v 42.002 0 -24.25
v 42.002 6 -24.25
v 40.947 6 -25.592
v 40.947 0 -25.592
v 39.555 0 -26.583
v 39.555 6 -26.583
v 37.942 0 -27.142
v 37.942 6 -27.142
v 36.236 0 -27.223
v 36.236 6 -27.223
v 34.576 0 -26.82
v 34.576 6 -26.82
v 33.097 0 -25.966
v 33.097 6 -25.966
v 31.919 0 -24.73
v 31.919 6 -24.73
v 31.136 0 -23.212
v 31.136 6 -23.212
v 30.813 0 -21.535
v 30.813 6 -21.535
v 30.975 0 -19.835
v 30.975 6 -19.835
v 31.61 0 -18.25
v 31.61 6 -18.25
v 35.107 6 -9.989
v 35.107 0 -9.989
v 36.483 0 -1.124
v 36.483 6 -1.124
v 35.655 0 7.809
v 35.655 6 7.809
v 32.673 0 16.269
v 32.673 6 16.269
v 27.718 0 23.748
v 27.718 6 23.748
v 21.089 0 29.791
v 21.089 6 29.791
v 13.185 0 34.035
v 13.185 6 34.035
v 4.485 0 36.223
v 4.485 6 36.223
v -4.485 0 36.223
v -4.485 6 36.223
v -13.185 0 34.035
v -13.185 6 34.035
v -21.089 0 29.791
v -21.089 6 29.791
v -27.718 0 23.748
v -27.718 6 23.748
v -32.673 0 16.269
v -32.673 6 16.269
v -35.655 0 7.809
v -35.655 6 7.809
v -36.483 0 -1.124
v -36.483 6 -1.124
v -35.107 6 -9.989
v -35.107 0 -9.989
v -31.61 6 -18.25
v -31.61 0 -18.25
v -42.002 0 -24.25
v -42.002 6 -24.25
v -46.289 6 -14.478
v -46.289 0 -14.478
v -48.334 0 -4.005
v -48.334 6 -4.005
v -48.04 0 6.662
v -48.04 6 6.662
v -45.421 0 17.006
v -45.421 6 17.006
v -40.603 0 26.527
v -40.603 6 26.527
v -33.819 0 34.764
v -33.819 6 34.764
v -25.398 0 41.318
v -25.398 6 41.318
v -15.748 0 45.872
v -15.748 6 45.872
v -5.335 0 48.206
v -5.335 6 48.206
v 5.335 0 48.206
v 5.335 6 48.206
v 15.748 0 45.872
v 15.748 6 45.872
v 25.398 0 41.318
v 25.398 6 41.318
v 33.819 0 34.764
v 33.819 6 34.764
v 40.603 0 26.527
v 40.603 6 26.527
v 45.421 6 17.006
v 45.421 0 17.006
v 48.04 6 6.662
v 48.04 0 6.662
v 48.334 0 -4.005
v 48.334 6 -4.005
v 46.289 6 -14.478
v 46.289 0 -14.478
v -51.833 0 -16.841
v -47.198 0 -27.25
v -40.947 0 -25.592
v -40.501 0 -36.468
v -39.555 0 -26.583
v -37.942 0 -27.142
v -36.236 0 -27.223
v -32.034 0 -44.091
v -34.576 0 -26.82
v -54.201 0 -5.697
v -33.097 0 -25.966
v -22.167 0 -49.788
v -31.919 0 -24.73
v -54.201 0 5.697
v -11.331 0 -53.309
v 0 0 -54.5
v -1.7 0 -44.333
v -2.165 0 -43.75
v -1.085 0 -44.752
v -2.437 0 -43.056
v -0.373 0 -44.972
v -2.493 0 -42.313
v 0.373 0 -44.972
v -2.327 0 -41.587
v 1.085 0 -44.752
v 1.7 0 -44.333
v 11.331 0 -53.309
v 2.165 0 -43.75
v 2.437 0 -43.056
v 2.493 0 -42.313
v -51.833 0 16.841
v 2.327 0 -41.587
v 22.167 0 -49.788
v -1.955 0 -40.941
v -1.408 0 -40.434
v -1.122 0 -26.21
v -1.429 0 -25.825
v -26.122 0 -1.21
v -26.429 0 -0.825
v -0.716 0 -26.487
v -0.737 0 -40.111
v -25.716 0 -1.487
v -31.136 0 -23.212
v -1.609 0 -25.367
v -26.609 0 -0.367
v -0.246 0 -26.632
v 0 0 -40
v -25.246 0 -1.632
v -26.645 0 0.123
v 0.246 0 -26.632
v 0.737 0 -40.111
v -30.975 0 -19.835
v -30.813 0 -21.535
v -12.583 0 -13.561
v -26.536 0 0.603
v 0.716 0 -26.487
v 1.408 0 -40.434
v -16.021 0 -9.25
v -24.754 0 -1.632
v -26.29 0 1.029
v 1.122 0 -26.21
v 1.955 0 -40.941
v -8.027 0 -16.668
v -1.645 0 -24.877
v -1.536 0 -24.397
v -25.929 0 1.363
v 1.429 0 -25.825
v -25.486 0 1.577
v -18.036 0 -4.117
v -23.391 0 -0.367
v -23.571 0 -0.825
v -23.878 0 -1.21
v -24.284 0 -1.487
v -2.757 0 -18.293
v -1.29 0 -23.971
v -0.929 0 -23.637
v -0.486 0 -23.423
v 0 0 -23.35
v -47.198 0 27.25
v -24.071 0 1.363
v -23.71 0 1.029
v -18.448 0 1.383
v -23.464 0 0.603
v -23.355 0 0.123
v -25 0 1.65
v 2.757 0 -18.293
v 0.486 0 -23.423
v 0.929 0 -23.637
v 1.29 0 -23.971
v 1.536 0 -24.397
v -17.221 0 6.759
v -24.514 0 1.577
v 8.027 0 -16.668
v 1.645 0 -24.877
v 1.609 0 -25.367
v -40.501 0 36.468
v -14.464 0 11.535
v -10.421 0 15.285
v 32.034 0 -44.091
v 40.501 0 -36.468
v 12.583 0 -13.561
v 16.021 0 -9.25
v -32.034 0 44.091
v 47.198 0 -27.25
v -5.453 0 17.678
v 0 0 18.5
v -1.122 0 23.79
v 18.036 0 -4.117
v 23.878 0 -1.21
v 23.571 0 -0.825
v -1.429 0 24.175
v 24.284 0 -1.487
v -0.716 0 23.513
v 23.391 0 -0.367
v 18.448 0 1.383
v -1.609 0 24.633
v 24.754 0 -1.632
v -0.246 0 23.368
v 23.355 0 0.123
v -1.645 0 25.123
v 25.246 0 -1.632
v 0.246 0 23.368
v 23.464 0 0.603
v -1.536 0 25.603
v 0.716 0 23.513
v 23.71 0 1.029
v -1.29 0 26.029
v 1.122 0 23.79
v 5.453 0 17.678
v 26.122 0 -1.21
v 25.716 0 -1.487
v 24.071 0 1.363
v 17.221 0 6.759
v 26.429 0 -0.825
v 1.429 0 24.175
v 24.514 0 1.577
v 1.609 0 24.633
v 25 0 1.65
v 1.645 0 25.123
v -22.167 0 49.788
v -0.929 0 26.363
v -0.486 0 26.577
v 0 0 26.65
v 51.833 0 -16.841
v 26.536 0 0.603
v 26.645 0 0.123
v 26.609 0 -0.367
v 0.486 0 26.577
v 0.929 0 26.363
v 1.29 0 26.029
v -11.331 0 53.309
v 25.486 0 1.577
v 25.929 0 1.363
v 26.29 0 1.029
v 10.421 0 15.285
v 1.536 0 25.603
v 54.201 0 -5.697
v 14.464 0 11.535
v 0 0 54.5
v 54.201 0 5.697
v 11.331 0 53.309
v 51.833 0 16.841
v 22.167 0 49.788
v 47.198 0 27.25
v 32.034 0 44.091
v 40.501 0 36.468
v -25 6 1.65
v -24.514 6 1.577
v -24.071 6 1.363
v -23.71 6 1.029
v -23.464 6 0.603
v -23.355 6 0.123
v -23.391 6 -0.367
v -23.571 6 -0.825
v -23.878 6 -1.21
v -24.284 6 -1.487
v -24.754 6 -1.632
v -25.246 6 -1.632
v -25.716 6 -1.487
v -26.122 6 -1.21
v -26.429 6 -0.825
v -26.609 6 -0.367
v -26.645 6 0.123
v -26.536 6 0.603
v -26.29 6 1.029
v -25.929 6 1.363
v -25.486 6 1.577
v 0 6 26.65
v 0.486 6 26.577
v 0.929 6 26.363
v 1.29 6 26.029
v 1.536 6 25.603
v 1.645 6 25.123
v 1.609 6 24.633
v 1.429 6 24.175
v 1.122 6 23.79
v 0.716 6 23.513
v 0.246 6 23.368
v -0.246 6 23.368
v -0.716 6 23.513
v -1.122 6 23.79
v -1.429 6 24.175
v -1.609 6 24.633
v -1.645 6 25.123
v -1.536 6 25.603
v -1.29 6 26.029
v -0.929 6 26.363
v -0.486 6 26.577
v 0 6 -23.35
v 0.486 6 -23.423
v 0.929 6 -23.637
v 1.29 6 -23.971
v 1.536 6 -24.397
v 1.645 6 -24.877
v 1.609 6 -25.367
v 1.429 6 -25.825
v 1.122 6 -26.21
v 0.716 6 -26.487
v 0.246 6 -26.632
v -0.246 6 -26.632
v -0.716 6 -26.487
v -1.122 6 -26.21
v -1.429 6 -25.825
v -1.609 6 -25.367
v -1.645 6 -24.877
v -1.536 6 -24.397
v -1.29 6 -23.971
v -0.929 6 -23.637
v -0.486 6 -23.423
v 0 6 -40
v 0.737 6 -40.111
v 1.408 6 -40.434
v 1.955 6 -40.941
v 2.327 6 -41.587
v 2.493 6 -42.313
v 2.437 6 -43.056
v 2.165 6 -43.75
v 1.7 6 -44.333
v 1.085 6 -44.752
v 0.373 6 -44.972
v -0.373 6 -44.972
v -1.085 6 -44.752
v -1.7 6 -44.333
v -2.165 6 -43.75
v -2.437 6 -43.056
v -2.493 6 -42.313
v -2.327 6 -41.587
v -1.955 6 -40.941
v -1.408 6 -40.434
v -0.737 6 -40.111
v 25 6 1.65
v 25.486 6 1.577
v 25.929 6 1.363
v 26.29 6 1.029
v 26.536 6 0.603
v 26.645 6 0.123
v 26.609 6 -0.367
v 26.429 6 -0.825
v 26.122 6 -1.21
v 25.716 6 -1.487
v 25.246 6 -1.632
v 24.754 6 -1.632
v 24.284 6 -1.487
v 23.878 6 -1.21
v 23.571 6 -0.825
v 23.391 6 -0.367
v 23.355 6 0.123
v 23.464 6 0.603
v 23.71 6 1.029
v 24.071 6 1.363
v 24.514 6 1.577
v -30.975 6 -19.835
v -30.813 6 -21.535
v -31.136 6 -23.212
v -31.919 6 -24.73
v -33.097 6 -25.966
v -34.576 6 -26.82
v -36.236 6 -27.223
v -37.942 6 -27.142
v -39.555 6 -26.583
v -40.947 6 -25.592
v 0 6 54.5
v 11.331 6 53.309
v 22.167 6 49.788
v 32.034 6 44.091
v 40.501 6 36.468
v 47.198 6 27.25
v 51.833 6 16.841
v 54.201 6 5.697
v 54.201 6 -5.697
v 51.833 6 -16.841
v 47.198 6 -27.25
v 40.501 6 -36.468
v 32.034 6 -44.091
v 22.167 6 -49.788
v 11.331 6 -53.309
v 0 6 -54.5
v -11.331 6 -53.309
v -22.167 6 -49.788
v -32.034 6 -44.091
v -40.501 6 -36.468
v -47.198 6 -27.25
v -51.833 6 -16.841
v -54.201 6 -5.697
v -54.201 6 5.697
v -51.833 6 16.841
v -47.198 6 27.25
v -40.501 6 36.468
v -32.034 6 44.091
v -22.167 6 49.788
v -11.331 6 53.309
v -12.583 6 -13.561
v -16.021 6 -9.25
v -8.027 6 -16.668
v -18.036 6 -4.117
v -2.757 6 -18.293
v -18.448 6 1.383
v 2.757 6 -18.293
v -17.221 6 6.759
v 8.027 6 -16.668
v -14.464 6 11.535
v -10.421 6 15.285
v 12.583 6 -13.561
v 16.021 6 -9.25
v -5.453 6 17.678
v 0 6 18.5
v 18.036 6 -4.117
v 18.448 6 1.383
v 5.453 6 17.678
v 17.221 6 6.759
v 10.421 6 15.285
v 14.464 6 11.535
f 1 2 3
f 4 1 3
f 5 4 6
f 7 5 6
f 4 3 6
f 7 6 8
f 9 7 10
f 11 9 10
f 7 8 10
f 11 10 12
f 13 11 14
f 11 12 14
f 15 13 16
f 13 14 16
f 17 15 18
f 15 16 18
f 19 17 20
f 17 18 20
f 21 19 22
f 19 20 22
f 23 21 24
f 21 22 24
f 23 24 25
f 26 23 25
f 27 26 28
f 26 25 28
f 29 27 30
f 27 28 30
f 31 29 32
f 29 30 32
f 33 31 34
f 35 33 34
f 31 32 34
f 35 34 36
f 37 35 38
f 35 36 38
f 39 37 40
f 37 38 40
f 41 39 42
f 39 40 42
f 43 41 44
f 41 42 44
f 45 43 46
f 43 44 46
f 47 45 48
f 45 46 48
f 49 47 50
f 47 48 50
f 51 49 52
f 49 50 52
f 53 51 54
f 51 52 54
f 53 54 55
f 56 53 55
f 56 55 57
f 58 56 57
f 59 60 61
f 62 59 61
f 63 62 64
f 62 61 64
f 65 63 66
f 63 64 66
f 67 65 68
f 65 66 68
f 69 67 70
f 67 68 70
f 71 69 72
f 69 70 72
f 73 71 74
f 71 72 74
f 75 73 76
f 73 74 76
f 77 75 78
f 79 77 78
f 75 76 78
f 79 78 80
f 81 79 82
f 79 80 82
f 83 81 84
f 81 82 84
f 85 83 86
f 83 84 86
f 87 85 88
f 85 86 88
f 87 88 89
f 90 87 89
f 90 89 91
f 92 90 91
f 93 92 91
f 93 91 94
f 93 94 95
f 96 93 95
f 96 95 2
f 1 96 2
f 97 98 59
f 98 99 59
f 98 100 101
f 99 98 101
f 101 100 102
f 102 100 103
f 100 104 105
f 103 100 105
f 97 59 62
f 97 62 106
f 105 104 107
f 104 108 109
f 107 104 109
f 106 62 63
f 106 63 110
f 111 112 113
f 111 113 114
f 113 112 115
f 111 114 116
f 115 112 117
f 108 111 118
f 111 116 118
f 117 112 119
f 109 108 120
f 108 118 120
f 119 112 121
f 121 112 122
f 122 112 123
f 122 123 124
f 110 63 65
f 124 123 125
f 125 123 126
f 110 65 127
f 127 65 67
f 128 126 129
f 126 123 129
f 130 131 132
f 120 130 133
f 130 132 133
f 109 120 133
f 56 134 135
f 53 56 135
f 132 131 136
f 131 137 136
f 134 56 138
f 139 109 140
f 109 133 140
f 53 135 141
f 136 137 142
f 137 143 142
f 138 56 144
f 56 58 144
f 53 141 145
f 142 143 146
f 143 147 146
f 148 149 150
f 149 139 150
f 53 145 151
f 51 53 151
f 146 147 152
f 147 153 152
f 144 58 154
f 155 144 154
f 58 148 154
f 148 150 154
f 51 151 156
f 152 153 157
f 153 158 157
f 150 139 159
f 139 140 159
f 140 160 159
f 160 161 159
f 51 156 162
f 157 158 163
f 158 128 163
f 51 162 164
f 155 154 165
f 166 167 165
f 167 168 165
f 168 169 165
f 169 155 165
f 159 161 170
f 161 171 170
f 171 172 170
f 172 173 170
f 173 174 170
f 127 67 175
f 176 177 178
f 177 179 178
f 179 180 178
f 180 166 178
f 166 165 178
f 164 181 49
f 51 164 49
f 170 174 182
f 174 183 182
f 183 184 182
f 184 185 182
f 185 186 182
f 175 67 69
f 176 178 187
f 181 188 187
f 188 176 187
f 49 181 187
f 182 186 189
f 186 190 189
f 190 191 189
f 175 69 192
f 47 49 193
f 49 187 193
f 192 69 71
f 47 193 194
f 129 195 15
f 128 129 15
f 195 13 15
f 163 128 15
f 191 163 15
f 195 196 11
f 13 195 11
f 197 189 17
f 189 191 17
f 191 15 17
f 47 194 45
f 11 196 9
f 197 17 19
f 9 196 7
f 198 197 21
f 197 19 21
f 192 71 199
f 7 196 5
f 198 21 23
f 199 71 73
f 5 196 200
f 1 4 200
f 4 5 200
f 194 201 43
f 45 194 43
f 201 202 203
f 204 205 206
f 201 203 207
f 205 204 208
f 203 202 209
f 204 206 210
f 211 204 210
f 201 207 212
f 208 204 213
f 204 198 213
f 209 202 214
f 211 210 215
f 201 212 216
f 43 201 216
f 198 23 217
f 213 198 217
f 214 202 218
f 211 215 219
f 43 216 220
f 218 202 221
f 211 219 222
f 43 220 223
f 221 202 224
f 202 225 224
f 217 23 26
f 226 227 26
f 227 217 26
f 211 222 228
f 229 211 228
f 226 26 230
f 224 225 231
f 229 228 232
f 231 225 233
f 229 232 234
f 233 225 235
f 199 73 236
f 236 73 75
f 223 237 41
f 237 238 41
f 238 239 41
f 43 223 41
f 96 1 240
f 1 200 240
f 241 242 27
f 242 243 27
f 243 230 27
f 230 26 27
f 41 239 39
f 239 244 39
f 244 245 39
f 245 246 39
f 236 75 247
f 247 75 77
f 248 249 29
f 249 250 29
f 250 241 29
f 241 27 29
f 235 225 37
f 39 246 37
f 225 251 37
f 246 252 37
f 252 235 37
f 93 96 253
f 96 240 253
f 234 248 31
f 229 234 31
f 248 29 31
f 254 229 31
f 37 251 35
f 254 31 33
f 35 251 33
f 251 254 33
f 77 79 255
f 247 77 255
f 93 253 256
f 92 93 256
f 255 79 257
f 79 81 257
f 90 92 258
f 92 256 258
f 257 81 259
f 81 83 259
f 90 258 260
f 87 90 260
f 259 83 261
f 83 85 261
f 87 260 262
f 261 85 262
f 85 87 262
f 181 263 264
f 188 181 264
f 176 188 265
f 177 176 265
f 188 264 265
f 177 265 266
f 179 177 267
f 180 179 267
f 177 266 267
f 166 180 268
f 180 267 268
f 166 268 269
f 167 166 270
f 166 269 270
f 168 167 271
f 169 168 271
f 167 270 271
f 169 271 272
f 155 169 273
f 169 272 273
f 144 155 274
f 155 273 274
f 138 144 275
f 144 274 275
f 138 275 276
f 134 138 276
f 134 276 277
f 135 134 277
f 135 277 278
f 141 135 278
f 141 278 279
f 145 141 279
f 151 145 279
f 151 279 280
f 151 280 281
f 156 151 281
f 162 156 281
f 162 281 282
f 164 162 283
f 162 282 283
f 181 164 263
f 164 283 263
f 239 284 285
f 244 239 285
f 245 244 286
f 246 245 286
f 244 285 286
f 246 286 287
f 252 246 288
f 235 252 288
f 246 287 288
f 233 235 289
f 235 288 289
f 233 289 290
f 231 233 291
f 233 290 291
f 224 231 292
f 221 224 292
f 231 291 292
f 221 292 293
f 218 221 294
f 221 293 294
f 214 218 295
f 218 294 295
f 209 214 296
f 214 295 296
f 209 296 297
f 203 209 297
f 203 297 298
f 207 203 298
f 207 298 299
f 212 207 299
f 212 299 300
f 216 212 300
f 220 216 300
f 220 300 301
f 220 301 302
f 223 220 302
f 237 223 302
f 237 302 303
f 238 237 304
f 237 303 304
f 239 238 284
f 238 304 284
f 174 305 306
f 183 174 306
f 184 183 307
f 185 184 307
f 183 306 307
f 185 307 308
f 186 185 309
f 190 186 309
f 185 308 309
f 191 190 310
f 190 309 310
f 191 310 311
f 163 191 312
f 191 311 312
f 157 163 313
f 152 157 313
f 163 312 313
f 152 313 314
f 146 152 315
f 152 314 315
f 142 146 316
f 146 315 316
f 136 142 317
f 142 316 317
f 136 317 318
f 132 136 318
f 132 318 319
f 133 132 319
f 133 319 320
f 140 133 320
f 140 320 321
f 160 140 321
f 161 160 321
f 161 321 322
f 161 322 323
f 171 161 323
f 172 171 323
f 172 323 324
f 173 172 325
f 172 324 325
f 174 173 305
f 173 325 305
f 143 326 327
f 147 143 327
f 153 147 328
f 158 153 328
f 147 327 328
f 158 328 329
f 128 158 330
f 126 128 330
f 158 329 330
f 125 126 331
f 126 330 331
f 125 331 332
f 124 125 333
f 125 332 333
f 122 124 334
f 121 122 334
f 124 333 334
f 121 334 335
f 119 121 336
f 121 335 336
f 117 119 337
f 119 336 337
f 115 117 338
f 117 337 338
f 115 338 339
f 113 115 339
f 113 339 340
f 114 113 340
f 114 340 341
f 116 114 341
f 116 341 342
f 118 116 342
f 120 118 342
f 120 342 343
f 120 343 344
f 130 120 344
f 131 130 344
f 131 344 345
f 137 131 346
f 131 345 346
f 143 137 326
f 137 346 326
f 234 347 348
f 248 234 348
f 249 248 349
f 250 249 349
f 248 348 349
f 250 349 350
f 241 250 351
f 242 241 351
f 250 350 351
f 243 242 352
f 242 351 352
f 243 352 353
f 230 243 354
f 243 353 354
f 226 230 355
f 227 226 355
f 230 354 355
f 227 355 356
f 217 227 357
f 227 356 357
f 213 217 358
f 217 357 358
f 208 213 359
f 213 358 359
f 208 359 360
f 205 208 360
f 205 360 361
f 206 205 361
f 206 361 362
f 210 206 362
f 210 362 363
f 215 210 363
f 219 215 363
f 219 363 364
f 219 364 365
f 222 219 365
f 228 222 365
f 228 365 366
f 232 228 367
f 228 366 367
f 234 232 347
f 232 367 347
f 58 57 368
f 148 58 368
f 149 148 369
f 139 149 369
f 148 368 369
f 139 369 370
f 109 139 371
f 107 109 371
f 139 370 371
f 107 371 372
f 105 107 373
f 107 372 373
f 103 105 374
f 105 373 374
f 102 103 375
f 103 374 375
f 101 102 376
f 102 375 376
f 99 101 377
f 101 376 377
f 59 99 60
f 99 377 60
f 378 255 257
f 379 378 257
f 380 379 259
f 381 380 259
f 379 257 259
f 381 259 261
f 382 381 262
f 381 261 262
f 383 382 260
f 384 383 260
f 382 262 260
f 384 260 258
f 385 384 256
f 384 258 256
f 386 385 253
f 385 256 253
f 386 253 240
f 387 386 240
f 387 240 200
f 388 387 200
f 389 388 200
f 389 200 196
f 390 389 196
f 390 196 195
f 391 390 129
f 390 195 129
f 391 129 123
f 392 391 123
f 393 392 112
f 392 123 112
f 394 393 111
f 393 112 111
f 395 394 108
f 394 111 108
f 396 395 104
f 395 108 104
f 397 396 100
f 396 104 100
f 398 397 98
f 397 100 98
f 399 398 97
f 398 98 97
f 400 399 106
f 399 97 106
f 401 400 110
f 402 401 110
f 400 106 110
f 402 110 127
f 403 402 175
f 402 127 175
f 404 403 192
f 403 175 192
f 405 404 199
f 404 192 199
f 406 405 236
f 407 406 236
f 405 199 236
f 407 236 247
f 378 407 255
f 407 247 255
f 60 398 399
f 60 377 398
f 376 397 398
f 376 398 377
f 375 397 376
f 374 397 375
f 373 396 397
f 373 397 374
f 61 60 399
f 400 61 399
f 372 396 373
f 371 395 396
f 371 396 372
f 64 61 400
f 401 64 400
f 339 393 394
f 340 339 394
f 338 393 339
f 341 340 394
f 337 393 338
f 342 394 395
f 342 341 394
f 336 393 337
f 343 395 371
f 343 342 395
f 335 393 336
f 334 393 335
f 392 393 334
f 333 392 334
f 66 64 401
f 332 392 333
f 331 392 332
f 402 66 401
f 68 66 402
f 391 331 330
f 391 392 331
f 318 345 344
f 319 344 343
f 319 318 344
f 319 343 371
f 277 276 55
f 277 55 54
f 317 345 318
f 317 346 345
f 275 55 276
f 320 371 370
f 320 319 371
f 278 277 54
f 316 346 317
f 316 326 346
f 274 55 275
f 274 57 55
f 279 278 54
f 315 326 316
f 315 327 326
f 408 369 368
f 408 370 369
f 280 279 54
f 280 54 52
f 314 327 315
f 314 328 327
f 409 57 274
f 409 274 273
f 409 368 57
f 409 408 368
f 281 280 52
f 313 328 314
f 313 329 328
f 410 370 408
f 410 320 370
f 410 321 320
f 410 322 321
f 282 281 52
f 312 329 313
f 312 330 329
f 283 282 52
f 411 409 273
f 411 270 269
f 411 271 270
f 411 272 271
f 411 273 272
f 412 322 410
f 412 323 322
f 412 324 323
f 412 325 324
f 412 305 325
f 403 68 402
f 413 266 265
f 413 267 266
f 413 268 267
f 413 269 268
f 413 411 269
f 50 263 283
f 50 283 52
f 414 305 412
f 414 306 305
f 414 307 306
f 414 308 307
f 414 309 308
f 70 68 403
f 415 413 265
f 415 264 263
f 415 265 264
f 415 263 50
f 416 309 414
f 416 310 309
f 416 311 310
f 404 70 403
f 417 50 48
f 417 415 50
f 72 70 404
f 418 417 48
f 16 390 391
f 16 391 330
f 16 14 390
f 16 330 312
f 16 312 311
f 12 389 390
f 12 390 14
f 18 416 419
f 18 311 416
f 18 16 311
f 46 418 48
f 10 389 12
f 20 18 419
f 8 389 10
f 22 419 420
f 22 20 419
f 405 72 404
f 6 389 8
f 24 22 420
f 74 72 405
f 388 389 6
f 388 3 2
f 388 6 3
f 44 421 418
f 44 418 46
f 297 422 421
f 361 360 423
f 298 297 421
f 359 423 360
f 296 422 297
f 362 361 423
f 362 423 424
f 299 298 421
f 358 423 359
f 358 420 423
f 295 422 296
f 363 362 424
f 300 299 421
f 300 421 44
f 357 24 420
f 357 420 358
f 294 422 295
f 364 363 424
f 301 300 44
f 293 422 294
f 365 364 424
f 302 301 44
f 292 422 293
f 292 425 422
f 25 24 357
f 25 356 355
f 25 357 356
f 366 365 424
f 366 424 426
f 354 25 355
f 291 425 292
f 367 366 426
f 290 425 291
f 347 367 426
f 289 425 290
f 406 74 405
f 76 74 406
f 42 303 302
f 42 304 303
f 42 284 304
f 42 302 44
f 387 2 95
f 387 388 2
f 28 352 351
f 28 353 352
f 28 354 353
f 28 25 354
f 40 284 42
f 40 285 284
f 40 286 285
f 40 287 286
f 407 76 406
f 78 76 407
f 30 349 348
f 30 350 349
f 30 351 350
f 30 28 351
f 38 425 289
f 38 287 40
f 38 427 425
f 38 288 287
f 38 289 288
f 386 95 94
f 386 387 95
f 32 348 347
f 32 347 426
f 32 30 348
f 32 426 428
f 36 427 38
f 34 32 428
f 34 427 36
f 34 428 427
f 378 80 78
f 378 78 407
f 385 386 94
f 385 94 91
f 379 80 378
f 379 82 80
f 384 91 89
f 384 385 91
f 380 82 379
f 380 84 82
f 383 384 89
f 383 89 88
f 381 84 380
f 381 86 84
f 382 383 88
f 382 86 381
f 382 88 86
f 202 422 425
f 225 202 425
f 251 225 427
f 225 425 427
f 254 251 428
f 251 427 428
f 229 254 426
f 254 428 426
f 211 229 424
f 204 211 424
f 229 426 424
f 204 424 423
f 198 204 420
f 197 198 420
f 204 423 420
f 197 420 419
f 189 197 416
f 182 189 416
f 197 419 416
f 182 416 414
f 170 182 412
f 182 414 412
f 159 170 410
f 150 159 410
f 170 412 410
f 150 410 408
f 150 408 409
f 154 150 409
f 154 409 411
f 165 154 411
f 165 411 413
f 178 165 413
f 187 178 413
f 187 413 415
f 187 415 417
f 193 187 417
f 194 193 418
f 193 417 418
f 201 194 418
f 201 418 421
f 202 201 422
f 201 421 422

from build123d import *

# Parameters (mm, degrees)
SKETCH_1_R          = 54.5
EXTRUDE_1_DEPTH     = 6
SKETCH_2_R          = 2.5
CUT_EXTRUDE_1_DEPTH = 6
SKETCH_3_R          = 18.5
SKETCH_3_R_2        = 1.65
CUT_EXTRUDE_2_DEPTH = 6


with BuildPart() as part:
    # Эскиз1 → Бобышка-Вытянуть1 (new body)
    with BuildSketch(Plane(origin=(0, 0, 0), x_dir=(1, 0, 0), z_dir=(0, 1, 0))):
        with Locations(Location((0, 0, 0), (0, 0, 270))):
            Circle(SKETCH_1_R)
    extrude(amount=EXTRUDE_1_DEPTH)

    # Эскиз2 → Вырез-Вытянуть1 (cut)
    with BuildSketch(Plane(origin=(0, 6, 0), x_dir=(1, 0, 0), z_dir=(0, 1, 0))):
        with Locations(Location((0, 42.5, 0), (0, 0, 270))):
            Circle(SKETCH_2_R)
        with BuildLine():
            ThreePointArc((-42.002232084, 24.25), (0, -48.5), (42.002232084, 24.25))
            ThreePointArc((42.002232084, 24.25), (33.806079661, 26.446152423), (31.609927238, 18.25))
            ThreePointArc((31.609927238, 18.25), (0, -36.5), (-31.609927238, 18.25))
            ThreePointArc((-31.609927238, 18.25), (-33.806079661, 26.446152423), (-42.002232084, 24.25))
        make_face()
    extrude(amount=-CUT_EXTRUDE_1_DEPTH, mode=Mode.SUBTRACT)

    # Эскиз3 → Вырез-Вытянуть2 (cut)
    with BuildSketch(Plane(origin=(0, 6, 0), x_dir=(1, 0, 0), z_dir=(0, 1, 0))):
        with Locations(Location((0, 0, 0), (0, 0, 270))):
            Circle(SKETCH_3_R)
        with Locations(Location((0, 25, 0), (0, 0, 270))):
            Circle(SKETCH_3_R_2)
        with Locations(Location((-25, 0, 0), (0, 0, 270))):
            Circle(SKETCH_3_R_2)
        with Locations(Location((0, -25, 0), (0, 0, 270))):
            Circle(SKETCH_3_R_2)
        with Locations(Location((25, 0, 0), (0, 0, 270))):
            Circle(SKETCH_3_R_2)
    extrude(amount=-CUT_EXTRUDE_2_DEPTH, mode=Mode.SUBTRACT)


solid = part.part
